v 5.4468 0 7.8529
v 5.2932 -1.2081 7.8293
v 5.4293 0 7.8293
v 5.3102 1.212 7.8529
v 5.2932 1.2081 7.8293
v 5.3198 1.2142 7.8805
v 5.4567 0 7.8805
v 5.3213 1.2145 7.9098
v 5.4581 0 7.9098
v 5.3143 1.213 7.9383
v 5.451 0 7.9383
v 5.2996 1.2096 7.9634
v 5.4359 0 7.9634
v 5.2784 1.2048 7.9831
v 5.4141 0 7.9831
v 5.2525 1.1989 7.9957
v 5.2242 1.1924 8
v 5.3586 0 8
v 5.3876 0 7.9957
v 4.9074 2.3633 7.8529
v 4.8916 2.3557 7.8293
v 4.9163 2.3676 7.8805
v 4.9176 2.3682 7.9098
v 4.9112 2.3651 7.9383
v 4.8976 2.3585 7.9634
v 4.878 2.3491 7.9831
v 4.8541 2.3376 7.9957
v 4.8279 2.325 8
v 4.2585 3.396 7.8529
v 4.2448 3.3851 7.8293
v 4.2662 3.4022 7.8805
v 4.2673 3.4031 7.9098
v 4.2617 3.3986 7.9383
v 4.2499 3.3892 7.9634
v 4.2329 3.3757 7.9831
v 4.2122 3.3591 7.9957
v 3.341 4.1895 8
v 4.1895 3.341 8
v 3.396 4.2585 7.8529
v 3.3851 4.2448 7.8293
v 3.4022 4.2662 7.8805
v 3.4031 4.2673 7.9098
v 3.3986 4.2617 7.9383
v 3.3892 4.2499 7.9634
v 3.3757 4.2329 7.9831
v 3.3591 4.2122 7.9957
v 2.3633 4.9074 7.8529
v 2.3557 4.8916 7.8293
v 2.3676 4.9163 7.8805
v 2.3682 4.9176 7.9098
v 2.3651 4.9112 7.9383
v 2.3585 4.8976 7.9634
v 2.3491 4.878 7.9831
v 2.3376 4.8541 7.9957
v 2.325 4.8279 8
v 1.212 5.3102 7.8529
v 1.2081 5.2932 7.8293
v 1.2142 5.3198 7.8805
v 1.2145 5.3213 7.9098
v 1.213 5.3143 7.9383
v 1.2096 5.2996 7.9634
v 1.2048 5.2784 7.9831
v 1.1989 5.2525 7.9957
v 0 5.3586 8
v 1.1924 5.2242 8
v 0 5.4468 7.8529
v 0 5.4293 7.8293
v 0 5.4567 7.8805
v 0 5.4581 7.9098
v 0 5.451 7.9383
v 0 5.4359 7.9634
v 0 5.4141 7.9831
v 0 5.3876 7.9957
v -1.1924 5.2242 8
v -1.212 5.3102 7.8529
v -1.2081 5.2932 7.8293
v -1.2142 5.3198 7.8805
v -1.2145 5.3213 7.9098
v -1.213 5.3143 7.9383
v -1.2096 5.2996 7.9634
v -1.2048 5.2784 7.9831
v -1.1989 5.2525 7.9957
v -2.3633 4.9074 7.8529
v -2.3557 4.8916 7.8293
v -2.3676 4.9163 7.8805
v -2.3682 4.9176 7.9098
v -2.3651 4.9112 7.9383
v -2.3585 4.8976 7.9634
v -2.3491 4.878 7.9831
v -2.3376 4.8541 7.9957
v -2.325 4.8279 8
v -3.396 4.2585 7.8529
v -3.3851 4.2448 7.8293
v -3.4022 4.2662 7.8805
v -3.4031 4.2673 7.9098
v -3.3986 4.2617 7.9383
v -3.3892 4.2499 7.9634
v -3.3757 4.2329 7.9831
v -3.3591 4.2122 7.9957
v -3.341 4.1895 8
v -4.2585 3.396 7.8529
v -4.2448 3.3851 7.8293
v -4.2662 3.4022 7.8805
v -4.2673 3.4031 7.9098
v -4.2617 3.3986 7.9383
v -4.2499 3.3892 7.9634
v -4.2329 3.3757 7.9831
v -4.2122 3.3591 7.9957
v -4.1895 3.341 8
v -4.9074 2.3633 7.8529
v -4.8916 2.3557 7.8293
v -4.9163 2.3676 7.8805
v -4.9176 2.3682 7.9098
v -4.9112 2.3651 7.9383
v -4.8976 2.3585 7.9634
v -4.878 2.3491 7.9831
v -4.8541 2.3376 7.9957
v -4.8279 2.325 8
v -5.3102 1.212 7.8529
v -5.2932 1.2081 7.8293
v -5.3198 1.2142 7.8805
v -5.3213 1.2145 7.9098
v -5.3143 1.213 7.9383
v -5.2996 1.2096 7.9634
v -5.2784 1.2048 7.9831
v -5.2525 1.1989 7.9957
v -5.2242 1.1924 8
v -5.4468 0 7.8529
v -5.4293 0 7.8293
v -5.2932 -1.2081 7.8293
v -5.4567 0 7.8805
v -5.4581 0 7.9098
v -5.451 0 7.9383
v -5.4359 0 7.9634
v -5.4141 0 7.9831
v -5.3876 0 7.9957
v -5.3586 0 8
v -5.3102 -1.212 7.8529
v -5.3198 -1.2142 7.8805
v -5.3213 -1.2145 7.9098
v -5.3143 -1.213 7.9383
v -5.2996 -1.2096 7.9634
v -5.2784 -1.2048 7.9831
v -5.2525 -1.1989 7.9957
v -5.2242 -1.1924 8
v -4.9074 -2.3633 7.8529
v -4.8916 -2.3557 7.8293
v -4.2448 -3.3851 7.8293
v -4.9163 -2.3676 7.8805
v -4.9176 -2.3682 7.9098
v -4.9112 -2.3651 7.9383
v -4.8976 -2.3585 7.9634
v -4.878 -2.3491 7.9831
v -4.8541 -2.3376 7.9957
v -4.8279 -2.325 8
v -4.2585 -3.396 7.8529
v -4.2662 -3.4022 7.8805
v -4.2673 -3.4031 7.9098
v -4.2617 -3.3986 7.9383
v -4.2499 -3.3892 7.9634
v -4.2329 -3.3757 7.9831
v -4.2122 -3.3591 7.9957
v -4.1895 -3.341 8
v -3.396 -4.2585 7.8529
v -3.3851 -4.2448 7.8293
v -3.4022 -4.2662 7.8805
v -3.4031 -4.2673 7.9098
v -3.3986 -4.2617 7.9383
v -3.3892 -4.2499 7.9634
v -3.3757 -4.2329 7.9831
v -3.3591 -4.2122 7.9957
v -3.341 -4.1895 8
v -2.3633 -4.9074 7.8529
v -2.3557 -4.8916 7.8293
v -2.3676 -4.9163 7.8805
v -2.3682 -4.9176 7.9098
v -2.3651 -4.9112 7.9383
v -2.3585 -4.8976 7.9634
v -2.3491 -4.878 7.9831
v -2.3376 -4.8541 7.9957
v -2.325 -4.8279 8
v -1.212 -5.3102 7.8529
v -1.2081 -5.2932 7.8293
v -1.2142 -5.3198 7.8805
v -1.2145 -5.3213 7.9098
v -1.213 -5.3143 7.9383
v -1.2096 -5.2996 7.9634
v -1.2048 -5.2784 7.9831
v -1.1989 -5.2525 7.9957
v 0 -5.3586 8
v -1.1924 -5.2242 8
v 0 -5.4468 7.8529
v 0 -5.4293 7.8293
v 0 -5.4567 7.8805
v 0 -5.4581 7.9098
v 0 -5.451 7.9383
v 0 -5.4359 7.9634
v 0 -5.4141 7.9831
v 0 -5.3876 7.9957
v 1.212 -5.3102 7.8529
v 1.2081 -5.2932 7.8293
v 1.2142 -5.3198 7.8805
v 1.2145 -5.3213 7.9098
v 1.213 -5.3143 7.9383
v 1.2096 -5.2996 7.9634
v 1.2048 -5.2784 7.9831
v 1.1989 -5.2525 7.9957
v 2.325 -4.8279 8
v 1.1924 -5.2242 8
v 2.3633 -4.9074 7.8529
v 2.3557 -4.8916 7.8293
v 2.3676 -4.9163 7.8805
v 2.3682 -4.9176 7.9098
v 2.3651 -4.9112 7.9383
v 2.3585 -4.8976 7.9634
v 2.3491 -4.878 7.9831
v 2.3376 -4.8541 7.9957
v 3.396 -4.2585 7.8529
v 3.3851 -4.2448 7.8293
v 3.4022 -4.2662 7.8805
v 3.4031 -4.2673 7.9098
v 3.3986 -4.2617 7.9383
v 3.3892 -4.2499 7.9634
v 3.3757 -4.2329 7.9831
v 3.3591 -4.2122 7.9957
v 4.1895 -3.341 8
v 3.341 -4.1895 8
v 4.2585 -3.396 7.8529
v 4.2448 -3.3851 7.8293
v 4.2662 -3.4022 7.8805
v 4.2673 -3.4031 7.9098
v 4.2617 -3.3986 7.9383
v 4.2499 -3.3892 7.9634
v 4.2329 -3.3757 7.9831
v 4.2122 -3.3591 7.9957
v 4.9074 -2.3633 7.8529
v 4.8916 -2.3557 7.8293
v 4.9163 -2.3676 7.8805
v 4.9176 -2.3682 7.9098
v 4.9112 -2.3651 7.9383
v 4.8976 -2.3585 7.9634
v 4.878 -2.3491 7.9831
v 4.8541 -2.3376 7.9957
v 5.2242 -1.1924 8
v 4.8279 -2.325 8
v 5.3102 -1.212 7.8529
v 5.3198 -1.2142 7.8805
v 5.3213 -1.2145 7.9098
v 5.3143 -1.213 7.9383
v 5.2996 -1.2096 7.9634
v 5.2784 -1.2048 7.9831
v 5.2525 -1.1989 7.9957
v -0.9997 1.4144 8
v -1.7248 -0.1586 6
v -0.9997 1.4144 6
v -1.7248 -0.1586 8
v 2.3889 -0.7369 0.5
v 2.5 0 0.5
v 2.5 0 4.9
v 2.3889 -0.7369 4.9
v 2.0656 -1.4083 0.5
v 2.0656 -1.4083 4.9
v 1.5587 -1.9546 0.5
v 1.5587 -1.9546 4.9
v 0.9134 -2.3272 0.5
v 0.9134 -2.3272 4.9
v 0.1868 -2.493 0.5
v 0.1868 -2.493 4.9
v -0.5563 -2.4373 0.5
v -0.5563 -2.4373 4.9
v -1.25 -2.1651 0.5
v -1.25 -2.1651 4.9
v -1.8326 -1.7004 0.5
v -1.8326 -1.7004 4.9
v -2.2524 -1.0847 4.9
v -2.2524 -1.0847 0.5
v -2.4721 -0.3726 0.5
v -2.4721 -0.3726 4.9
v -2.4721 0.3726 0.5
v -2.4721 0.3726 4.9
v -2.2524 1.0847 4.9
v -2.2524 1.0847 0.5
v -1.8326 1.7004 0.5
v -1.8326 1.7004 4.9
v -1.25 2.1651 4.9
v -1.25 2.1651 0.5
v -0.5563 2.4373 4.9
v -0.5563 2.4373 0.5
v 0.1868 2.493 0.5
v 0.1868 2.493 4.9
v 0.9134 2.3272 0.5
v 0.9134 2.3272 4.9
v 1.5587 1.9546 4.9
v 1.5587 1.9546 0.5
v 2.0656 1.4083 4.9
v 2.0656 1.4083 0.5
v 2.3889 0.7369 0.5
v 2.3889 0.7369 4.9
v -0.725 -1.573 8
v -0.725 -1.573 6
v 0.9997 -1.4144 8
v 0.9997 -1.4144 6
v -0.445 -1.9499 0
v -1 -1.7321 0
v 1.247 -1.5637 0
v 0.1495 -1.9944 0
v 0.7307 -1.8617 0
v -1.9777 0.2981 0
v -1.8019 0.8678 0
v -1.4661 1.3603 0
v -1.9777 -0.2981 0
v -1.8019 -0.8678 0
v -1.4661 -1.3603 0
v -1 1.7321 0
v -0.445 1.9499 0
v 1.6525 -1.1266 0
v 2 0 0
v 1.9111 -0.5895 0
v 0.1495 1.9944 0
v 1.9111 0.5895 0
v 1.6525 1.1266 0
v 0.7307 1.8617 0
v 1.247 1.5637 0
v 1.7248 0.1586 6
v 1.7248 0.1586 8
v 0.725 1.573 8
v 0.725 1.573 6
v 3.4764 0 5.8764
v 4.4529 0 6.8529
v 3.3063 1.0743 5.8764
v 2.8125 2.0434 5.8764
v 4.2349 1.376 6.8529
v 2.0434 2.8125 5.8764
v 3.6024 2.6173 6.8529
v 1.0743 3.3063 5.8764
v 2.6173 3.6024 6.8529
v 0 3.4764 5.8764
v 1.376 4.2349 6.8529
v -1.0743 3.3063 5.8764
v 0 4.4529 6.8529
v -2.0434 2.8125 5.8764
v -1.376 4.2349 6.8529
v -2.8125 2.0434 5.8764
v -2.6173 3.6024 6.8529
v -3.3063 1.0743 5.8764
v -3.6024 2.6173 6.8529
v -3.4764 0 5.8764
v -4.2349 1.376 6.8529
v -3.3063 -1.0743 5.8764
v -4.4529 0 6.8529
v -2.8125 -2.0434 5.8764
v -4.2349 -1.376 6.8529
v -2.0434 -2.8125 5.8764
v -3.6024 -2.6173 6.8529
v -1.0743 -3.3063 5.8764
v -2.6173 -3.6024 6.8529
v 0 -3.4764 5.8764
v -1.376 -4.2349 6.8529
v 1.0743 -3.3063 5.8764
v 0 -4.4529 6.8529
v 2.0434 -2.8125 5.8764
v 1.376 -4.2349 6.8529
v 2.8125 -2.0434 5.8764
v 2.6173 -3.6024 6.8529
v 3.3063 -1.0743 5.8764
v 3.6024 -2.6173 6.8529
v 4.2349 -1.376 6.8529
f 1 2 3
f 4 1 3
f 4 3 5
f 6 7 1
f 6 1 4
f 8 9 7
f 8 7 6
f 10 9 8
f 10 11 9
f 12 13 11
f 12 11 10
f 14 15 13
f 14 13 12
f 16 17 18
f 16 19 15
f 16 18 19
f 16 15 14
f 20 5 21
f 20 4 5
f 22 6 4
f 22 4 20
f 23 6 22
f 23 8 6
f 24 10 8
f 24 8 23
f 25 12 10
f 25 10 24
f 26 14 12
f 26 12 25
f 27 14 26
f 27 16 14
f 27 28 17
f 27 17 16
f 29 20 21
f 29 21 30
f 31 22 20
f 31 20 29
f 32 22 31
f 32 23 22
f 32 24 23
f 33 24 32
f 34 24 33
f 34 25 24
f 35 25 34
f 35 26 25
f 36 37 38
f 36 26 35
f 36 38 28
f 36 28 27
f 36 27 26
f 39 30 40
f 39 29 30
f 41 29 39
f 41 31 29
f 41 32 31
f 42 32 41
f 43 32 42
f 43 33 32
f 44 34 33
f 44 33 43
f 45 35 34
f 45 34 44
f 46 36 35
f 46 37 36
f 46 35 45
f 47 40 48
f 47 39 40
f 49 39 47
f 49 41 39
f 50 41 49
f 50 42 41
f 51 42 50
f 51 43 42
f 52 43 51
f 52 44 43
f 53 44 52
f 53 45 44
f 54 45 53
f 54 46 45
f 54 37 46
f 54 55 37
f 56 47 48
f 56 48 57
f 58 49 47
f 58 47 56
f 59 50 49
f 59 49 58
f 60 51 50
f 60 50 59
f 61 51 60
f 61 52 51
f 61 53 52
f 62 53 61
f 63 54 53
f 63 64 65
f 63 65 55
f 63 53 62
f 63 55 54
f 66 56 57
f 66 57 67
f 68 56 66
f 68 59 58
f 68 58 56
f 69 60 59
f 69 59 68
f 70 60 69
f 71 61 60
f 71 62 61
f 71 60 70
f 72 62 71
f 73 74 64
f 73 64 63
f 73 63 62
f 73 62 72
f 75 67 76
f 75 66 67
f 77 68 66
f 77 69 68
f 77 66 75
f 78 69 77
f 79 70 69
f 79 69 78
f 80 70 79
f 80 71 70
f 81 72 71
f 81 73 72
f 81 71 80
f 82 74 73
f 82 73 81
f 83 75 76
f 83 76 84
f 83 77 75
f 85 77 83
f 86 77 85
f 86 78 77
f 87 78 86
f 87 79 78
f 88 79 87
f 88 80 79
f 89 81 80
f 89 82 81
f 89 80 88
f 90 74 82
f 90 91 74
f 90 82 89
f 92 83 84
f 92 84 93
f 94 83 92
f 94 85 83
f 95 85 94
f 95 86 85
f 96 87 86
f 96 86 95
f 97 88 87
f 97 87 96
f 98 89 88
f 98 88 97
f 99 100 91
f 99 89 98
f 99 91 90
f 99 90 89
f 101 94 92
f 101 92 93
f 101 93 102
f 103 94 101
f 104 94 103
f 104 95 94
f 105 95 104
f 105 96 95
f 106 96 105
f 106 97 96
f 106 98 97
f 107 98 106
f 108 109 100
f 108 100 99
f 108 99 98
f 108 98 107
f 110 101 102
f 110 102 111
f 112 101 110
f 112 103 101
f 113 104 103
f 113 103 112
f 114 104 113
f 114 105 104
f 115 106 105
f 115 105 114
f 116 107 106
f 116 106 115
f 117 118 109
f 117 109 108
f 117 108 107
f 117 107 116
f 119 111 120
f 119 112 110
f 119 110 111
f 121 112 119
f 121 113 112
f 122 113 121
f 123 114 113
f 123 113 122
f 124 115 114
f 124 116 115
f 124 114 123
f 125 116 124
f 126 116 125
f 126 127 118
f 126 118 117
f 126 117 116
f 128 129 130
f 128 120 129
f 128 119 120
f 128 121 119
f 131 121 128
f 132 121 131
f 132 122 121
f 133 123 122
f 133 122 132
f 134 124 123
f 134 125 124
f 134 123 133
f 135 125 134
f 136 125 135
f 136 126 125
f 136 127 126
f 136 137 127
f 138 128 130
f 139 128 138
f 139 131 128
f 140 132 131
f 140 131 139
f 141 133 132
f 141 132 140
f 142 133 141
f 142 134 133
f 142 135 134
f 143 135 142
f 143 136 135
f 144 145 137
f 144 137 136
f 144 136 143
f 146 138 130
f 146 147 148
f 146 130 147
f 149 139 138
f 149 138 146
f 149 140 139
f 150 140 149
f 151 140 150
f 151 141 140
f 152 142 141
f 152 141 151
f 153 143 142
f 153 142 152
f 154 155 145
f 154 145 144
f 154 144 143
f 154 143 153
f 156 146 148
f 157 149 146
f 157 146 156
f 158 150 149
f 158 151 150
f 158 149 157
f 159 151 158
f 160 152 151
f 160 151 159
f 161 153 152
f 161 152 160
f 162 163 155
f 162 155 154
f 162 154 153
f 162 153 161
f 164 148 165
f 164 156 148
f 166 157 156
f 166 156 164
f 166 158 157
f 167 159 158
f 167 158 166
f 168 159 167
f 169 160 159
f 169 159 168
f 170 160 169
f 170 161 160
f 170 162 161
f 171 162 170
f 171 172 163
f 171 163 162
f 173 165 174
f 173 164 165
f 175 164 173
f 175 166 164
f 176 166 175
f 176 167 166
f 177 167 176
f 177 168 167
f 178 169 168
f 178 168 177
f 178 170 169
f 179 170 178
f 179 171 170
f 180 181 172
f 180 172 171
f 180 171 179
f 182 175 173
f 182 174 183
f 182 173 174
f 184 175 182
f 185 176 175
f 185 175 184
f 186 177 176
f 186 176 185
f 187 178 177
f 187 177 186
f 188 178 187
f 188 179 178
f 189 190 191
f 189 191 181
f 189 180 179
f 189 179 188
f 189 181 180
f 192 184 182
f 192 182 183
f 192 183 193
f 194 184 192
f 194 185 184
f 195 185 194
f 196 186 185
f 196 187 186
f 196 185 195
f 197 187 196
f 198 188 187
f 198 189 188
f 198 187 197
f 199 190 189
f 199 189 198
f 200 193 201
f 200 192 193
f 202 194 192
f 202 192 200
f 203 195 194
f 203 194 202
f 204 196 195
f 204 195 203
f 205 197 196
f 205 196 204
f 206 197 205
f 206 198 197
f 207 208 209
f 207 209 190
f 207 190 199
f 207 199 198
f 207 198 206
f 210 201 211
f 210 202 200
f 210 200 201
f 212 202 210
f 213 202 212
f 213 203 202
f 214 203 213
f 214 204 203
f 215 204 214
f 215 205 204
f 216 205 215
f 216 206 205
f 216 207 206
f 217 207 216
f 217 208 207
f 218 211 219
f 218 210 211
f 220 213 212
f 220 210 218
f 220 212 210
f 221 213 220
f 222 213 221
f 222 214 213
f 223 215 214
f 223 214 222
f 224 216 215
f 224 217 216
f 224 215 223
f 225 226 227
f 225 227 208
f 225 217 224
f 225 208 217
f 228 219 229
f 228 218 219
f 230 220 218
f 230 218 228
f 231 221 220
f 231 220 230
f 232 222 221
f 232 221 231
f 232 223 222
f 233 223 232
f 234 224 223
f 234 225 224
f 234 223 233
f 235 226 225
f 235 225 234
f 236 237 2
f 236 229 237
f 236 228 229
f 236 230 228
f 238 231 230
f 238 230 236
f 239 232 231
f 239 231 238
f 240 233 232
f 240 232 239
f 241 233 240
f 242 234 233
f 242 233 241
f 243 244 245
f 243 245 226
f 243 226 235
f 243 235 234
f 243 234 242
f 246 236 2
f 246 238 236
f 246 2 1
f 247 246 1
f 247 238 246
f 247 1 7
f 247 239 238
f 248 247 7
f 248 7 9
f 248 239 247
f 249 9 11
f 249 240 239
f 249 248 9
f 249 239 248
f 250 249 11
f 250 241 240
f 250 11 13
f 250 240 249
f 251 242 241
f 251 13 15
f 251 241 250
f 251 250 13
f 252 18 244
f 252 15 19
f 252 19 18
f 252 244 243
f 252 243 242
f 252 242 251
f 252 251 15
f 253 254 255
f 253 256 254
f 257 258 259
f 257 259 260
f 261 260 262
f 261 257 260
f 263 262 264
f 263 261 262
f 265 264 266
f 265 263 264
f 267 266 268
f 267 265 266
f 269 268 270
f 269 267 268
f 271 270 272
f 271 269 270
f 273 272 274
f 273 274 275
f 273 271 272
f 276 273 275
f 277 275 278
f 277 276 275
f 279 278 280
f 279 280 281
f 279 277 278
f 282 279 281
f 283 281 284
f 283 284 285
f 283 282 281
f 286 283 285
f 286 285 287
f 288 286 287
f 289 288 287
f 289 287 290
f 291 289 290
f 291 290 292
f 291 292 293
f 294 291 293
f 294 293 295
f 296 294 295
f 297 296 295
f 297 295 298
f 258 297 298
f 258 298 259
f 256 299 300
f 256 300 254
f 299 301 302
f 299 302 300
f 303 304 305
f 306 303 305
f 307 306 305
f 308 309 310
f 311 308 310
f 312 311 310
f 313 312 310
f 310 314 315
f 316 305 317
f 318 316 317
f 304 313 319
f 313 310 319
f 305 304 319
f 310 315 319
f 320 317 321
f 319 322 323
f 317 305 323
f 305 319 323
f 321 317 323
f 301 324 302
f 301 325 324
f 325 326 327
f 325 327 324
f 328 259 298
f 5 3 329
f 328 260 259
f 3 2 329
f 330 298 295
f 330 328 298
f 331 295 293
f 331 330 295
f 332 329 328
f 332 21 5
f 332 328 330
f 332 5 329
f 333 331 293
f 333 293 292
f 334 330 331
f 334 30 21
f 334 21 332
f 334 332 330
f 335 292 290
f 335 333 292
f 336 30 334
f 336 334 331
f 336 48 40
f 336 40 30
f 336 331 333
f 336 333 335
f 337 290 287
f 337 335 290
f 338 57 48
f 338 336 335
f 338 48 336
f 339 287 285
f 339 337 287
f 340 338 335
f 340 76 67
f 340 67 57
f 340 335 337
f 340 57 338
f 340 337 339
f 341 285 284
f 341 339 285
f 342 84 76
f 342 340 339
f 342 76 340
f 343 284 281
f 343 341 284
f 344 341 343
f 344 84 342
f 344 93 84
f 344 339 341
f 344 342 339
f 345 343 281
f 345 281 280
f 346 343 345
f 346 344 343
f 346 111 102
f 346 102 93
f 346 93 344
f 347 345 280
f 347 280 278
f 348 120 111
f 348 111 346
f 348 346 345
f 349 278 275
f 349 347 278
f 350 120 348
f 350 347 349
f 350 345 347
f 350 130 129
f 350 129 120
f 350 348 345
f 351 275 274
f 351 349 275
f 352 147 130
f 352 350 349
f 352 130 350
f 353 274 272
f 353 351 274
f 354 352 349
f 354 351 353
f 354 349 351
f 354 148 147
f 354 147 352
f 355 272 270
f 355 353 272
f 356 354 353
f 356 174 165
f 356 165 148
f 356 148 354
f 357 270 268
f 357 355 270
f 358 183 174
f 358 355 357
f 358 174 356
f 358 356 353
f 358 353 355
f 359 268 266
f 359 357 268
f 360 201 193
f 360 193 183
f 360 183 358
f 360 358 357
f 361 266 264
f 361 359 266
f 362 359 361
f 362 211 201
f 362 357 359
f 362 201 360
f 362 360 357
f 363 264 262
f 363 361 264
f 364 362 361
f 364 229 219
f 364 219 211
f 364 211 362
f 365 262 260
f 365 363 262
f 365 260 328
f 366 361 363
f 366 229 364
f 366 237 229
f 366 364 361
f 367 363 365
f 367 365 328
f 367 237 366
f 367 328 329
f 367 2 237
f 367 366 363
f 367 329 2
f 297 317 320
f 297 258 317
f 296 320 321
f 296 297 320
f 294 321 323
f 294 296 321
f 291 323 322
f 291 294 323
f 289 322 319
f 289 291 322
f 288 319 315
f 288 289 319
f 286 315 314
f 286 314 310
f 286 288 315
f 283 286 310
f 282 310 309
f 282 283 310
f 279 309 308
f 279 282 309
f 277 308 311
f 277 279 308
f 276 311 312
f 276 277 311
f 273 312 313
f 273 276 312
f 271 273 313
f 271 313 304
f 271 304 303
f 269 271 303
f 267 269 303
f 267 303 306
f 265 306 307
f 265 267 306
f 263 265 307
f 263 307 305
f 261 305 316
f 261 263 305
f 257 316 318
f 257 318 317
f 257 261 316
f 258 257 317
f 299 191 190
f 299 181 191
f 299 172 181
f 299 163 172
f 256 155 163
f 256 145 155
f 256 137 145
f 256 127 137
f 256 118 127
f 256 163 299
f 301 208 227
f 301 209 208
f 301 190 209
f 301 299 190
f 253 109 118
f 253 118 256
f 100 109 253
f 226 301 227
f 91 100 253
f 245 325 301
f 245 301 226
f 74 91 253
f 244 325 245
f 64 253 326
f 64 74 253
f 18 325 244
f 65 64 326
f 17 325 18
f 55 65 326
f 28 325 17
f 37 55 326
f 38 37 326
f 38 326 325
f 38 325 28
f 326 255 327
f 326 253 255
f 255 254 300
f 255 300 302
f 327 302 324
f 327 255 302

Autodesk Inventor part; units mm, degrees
ref_plane "YZ Plane" through (0, 0, 0) normal (1, 0, 0) x (0, 1, 0)
ref_plane "XZ Plane" through (0, 0, 0) normal (0, 1, 0) x (-1, 0, 0)
ref_plane "XY Plane" through (0, 0, 0) normal (0, 0, 1) x (1, 0, 0)
sketch "Sketch1" plane through (0, 0, 0) normal (0, 0, 1) x (1, 0, 0)
  circle A0 centre (0, 0) radius 2.5
  dimension "Diameter" = 5
extrude "Extrusion1" add sketch "Sketch1" along normal blind 4.9
sketch "Sketch2" plane through (0, 0, 4.9) normal (0, 0, 1) x (1, 0, 0)
  circle A0 centre (0, 0) radius 2.5 projected
extrude "Extrusion2" add sketch "Sketch2" along normal blind 3.1 draft 45
sketch "Sketch3" plane through (0, 0, 8) normal (0, 0, 1) x (1, 0, 0)
  circle A0 centre (0, 0) radius 5.6 projected
  circle A1 centre (0, 0) radius 1.7321 construction
  line L0 (0.725, 1.573) -> (1.7248, 0.1586)
  line L1 (1.7248, 0.1586) -> (0.9997, -1.4144)
  line L2 (0.9997, -1.4144) -> (-0.725, -1.573)
  line L3 (-0.725, -1.573) -> (-1.7248, -0.1586)
  line L4 (-1.7248, -0.1586) -> (-0.9997, 1.4144)
  line L5 (-0.9997, 1.4144) -> (0.725, 1.573)
  dimension "Hex_Width" = 3
extrude "Extrusion3" cut sketch "Sketch3" against normal blind 2 contours L0 L1 L2 L3 L4 L5
thread "Thread1" size "M5x0.8" class "4g6g" standard "ANSI Metric M Profile" length 4.9
chamfer "Chamfer2" distance 0.5 angle 45 1 edges at (-2.5, 0, 0)
fillet "Fillet1" radius 0.1 1 edges at (-5.6, 0, 8)
equation "\"d10\" = Thread_Length"
equation "\"d13\" = Chamfer"
equation "\"Thread_Length\" = 4.9"
equation "\"Length\" = 8"
equation "\"Chamfer\" = 0.5"
properties part number "SCREW, FLAT HD, P, 5, M5X0.8X08MM"
